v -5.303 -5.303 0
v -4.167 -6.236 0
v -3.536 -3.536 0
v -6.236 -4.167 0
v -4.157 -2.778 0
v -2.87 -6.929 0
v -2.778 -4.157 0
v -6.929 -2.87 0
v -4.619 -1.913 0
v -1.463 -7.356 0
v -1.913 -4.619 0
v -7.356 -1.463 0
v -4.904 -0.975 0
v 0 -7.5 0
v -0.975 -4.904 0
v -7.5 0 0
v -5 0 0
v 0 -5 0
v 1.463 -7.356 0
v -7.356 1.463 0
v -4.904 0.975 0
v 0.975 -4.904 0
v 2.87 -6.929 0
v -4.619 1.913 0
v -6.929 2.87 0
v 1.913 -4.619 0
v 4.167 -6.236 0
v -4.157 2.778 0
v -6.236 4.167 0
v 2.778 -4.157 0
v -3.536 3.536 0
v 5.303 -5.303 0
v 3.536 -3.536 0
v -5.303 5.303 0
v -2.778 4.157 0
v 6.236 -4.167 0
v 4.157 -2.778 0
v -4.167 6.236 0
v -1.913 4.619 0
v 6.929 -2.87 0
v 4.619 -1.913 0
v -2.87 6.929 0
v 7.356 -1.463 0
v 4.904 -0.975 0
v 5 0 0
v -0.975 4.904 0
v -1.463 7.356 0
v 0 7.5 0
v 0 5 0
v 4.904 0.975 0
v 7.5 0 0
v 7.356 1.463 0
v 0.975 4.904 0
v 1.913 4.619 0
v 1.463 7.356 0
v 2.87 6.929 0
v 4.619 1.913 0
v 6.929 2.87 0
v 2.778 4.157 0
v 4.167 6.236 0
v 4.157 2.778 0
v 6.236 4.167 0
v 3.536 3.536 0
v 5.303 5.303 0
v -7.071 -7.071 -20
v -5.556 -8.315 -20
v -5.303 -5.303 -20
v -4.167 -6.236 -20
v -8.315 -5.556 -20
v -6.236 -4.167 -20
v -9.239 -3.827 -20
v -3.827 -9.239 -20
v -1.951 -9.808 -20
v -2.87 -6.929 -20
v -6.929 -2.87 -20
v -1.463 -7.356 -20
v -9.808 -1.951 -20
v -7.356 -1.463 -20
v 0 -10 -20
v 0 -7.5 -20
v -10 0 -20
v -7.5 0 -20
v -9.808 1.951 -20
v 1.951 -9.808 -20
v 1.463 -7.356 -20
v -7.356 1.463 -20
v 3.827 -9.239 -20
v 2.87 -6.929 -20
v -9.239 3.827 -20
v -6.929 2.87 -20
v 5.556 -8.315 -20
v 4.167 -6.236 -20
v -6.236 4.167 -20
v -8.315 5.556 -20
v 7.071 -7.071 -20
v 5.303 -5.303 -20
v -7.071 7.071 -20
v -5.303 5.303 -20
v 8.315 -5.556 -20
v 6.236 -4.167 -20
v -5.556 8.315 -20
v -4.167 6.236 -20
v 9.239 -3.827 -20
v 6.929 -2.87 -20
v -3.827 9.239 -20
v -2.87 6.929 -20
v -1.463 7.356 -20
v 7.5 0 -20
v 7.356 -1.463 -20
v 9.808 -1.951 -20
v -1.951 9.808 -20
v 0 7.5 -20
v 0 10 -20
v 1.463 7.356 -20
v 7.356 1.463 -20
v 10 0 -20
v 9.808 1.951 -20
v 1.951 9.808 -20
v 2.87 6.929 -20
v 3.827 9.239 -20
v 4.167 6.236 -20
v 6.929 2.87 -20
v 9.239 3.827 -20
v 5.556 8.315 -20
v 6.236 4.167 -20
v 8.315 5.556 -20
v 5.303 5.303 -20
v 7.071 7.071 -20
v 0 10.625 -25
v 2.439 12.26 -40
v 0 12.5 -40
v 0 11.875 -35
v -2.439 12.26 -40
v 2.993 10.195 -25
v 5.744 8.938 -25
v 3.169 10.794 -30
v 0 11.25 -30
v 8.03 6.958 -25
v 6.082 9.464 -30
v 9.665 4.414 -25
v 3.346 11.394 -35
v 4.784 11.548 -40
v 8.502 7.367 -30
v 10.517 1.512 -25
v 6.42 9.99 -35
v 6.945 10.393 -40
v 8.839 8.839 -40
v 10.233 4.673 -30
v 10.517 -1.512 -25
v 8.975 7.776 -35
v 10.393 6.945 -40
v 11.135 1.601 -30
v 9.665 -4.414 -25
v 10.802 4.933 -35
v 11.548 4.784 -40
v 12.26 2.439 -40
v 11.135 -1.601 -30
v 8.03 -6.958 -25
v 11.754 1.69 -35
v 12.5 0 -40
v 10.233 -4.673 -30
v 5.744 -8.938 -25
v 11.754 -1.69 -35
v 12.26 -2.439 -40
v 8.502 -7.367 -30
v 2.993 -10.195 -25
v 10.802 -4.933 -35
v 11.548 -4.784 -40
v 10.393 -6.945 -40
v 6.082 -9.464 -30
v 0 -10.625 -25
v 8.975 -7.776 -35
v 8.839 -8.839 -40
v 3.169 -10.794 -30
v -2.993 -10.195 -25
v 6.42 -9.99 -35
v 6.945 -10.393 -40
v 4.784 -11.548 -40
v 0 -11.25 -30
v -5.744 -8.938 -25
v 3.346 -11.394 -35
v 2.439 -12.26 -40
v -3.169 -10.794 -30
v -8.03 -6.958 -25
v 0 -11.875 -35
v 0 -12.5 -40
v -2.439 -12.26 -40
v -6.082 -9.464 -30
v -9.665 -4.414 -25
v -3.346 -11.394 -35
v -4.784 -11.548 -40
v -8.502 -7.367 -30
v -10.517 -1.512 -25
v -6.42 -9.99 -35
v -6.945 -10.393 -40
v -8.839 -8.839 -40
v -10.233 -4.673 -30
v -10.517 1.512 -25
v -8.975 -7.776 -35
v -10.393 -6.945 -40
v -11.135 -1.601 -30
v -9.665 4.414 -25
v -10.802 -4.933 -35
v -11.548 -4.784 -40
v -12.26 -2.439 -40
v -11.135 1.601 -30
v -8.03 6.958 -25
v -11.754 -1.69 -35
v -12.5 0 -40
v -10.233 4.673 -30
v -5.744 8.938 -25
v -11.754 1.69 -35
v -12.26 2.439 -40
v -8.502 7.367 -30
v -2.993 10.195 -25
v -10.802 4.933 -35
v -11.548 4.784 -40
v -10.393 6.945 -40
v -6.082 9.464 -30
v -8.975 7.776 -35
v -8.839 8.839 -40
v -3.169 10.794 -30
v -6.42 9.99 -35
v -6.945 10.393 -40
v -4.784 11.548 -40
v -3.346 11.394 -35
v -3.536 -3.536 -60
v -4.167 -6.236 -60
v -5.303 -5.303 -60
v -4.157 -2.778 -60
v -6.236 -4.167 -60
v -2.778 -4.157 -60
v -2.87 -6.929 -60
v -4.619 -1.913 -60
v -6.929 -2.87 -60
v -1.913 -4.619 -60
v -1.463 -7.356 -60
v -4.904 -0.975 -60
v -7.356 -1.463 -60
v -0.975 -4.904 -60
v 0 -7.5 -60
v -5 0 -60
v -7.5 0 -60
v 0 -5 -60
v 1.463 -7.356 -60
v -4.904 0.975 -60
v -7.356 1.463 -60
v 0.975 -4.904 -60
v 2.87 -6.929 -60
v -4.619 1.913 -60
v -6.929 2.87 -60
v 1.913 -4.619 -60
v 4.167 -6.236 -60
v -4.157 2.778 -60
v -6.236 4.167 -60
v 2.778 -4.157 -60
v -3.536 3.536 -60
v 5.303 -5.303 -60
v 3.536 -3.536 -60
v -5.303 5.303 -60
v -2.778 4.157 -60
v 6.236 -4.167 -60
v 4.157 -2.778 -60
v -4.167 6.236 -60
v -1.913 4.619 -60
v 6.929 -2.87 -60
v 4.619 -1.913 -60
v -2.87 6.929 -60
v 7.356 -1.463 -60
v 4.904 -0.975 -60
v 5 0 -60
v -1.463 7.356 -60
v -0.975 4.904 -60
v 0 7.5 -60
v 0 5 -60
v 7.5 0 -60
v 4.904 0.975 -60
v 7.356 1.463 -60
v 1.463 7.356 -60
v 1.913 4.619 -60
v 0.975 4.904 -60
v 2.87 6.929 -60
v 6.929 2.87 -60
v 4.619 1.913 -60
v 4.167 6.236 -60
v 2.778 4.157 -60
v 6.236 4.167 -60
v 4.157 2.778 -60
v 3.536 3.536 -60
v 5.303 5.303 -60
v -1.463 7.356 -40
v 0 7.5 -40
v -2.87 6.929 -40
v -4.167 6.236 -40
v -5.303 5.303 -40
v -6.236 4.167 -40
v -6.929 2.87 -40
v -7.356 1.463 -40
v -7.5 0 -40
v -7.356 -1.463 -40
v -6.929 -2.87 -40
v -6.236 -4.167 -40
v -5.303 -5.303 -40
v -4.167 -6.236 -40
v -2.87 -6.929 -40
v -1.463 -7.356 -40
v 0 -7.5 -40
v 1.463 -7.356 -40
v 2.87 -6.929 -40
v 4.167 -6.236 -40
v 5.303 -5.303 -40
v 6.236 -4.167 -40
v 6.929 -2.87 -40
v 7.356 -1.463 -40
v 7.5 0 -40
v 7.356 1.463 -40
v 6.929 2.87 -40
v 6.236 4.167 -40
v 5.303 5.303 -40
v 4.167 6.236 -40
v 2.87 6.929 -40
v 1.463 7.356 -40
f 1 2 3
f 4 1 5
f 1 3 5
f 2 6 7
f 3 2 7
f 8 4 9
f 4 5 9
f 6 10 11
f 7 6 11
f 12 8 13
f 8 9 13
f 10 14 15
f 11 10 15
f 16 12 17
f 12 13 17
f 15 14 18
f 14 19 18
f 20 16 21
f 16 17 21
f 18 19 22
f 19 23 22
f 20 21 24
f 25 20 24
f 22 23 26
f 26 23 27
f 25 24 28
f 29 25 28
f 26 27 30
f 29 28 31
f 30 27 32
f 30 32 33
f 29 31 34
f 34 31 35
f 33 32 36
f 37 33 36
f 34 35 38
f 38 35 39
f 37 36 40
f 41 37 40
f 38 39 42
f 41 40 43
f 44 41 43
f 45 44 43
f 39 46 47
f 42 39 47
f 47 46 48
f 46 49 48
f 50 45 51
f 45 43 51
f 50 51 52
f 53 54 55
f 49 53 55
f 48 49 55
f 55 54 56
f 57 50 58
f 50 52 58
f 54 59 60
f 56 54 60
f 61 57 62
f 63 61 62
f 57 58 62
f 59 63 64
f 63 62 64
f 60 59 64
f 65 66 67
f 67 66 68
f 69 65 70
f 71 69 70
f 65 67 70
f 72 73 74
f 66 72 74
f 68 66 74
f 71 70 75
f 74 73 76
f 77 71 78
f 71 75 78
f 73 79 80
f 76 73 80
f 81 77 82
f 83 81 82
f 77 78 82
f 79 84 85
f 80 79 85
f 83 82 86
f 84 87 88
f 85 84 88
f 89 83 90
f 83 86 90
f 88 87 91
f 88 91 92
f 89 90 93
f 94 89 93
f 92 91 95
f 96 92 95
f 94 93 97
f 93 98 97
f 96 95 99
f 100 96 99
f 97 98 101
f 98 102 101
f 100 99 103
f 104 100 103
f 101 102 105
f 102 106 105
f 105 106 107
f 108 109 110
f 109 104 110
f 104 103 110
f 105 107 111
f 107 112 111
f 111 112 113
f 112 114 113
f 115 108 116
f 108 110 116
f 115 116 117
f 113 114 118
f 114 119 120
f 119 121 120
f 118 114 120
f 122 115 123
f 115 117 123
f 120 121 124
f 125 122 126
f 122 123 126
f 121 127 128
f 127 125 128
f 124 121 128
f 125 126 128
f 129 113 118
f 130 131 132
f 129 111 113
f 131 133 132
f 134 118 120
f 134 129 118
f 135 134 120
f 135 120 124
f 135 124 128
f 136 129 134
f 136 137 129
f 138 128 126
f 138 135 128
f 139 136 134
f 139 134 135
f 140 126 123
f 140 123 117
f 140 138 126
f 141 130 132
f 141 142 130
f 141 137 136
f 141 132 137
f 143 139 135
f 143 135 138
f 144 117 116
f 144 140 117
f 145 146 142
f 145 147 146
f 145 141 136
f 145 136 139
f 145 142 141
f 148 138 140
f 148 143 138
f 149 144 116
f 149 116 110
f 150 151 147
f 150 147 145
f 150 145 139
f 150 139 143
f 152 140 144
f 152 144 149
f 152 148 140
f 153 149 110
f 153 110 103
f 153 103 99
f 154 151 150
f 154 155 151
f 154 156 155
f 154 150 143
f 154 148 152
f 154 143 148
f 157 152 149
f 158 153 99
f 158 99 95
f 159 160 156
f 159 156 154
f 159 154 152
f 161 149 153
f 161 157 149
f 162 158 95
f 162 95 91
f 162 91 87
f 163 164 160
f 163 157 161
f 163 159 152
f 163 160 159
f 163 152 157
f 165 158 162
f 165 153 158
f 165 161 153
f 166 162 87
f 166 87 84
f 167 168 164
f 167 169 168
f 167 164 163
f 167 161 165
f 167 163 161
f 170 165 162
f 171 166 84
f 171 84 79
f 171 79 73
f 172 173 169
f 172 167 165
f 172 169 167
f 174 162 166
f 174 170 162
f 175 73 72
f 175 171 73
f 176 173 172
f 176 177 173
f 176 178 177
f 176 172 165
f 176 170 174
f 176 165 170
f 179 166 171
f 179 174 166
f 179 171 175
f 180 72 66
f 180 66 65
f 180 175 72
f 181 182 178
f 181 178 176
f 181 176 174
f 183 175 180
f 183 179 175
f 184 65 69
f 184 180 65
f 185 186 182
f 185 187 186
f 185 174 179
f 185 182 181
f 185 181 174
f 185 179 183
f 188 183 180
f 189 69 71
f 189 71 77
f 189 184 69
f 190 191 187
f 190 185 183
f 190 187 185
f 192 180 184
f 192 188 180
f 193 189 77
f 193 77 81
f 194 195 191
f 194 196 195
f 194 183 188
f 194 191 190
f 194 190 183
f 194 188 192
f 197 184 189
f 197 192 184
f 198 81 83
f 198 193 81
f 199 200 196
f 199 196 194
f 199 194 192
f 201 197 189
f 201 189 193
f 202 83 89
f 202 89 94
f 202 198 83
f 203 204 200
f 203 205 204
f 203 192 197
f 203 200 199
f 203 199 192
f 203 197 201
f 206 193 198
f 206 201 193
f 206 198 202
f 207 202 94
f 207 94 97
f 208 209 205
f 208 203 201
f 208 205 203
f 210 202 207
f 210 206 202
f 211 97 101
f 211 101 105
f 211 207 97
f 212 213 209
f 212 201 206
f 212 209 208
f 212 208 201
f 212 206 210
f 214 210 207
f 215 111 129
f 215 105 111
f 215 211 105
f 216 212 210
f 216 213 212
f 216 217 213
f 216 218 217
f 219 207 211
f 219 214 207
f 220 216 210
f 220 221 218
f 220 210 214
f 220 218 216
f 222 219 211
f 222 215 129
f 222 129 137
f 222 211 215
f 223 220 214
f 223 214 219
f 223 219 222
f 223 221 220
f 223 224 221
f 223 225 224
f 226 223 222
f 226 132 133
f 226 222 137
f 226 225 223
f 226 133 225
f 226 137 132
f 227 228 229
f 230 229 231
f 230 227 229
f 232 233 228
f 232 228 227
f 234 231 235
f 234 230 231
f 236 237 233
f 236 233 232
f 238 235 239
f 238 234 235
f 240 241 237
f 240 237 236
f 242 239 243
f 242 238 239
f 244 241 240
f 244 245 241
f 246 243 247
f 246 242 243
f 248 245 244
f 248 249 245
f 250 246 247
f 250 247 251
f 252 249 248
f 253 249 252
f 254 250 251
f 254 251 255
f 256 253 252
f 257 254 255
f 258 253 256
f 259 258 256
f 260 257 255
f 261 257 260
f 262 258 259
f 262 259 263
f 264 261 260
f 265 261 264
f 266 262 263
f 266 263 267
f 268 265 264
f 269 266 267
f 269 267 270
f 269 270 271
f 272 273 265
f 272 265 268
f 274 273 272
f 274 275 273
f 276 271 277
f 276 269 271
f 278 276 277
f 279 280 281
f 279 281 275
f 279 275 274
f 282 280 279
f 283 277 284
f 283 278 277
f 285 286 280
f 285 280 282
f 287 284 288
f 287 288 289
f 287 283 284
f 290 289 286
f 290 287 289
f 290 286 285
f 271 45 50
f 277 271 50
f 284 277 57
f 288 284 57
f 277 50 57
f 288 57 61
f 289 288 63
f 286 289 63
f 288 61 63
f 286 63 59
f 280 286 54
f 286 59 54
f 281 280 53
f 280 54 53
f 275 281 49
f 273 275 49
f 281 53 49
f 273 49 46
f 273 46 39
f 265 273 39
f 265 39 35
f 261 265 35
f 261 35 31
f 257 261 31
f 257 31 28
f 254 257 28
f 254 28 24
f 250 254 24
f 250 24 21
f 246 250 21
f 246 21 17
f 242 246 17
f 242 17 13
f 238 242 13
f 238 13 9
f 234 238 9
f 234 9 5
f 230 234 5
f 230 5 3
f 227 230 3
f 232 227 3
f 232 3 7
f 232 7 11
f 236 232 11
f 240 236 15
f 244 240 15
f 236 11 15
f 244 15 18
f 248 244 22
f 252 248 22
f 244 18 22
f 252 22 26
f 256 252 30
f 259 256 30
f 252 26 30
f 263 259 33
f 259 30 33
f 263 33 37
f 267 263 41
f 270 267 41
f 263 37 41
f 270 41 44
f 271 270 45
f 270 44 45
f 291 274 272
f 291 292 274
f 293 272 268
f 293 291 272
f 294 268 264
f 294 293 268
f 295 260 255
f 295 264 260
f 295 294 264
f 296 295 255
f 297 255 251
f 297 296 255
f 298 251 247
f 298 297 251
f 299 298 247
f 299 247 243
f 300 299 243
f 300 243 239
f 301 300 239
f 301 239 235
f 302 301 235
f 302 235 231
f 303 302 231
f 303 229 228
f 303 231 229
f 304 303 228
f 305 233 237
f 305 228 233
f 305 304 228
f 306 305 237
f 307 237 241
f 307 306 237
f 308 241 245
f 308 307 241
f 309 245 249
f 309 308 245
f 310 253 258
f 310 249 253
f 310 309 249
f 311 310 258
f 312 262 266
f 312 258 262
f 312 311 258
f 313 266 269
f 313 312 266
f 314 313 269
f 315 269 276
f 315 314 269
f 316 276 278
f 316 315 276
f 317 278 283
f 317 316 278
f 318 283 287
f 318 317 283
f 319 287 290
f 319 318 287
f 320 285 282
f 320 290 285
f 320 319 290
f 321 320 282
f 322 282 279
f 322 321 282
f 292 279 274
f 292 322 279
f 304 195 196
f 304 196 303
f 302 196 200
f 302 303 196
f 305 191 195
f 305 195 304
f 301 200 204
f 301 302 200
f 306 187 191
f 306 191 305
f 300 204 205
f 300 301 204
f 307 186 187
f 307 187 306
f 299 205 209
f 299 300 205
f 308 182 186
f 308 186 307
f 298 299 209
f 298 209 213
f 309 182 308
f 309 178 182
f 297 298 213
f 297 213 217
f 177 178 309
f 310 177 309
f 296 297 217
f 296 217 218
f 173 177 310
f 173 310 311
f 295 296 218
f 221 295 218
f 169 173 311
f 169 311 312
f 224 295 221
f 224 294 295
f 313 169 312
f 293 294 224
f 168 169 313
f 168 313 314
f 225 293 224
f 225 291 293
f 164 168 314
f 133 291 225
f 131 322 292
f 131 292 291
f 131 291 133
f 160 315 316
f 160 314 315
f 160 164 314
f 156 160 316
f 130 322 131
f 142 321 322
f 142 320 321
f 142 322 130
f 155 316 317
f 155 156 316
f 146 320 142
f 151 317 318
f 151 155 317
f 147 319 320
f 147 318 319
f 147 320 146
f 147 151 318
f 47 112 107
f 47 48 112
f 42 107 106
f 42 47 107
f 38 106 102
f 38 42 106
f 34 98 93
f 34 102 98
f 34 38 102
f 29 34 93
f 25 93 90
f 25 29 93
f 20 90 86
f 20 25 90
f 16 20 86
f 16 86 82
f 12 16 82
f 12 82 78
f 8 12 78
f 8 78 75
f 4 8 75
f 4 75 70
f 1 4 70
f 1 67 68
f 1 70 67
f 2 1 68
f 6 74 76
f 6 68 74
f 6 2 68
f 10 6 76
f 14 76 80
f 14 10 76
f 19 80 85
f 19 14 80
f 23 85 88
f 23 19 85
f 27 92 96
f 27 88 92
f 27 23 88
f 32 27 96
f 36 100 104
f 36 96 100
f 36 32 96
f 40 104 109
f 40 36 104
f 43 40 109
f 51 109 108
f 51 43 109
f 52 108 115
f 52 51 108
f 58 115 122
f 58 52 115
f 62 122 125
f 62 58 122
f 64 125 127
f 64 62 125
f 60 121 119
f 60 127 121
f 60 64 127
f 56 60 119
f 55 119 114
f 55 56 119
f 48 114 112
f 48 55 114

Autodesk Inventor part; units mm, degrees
ref_plane "YZ Plane" through (0, 0, 0) normal (1, 0, 0) x (0, 1, 0)
ref_plane "XZ Plane" through (0, 0, 0) normal (0, 1, 0) x (-1, 0, 0)
ref_plane "XY Plane" through (0, 0, 0) normal (0, 0, 1) x (1, 0, 0)
sketch "Sketch1" plane through (0, 0, 0) normal (1, 0, 0) x (0, 1, 0)
  line L0 (0, 0) -> (0, -60)
  line L1 (0, -60) -> (7.5, -60)
  line L2 (7.5, -60) -> (7.5, -40)
  line L3 (7.5, -40) -> (12.5, -40)
  line L4 (12.5, -40) -> (10, -20)
  line L5 (10, -20) -> (7.5, -20)
  line L6 (7.5, -20) -> (7.5, 0)
  line L7 (7.5, 0) -> (0, 0)
  dimension "d0" = 40
  dimension "d1" = 20
  dimension "d2" = 2.5
  dimension "d3" = 5
  dimension "d4" = 15
  dimension "d5" = 20
revolve "Revolution1" add sketch "Sketch1" angle 360 about axis through (0, 0, 0) along (0, 0, -1)
sketch "Sketch2" plane through (0, 0, 0) normal (0, 0, 1) x (1, 0, 0)
  circle A0 centre (0, 0) radius 5
  dimension "d10" = 10
extrude "Extrusion2" cut sketch "Sketch2" against normal through all
